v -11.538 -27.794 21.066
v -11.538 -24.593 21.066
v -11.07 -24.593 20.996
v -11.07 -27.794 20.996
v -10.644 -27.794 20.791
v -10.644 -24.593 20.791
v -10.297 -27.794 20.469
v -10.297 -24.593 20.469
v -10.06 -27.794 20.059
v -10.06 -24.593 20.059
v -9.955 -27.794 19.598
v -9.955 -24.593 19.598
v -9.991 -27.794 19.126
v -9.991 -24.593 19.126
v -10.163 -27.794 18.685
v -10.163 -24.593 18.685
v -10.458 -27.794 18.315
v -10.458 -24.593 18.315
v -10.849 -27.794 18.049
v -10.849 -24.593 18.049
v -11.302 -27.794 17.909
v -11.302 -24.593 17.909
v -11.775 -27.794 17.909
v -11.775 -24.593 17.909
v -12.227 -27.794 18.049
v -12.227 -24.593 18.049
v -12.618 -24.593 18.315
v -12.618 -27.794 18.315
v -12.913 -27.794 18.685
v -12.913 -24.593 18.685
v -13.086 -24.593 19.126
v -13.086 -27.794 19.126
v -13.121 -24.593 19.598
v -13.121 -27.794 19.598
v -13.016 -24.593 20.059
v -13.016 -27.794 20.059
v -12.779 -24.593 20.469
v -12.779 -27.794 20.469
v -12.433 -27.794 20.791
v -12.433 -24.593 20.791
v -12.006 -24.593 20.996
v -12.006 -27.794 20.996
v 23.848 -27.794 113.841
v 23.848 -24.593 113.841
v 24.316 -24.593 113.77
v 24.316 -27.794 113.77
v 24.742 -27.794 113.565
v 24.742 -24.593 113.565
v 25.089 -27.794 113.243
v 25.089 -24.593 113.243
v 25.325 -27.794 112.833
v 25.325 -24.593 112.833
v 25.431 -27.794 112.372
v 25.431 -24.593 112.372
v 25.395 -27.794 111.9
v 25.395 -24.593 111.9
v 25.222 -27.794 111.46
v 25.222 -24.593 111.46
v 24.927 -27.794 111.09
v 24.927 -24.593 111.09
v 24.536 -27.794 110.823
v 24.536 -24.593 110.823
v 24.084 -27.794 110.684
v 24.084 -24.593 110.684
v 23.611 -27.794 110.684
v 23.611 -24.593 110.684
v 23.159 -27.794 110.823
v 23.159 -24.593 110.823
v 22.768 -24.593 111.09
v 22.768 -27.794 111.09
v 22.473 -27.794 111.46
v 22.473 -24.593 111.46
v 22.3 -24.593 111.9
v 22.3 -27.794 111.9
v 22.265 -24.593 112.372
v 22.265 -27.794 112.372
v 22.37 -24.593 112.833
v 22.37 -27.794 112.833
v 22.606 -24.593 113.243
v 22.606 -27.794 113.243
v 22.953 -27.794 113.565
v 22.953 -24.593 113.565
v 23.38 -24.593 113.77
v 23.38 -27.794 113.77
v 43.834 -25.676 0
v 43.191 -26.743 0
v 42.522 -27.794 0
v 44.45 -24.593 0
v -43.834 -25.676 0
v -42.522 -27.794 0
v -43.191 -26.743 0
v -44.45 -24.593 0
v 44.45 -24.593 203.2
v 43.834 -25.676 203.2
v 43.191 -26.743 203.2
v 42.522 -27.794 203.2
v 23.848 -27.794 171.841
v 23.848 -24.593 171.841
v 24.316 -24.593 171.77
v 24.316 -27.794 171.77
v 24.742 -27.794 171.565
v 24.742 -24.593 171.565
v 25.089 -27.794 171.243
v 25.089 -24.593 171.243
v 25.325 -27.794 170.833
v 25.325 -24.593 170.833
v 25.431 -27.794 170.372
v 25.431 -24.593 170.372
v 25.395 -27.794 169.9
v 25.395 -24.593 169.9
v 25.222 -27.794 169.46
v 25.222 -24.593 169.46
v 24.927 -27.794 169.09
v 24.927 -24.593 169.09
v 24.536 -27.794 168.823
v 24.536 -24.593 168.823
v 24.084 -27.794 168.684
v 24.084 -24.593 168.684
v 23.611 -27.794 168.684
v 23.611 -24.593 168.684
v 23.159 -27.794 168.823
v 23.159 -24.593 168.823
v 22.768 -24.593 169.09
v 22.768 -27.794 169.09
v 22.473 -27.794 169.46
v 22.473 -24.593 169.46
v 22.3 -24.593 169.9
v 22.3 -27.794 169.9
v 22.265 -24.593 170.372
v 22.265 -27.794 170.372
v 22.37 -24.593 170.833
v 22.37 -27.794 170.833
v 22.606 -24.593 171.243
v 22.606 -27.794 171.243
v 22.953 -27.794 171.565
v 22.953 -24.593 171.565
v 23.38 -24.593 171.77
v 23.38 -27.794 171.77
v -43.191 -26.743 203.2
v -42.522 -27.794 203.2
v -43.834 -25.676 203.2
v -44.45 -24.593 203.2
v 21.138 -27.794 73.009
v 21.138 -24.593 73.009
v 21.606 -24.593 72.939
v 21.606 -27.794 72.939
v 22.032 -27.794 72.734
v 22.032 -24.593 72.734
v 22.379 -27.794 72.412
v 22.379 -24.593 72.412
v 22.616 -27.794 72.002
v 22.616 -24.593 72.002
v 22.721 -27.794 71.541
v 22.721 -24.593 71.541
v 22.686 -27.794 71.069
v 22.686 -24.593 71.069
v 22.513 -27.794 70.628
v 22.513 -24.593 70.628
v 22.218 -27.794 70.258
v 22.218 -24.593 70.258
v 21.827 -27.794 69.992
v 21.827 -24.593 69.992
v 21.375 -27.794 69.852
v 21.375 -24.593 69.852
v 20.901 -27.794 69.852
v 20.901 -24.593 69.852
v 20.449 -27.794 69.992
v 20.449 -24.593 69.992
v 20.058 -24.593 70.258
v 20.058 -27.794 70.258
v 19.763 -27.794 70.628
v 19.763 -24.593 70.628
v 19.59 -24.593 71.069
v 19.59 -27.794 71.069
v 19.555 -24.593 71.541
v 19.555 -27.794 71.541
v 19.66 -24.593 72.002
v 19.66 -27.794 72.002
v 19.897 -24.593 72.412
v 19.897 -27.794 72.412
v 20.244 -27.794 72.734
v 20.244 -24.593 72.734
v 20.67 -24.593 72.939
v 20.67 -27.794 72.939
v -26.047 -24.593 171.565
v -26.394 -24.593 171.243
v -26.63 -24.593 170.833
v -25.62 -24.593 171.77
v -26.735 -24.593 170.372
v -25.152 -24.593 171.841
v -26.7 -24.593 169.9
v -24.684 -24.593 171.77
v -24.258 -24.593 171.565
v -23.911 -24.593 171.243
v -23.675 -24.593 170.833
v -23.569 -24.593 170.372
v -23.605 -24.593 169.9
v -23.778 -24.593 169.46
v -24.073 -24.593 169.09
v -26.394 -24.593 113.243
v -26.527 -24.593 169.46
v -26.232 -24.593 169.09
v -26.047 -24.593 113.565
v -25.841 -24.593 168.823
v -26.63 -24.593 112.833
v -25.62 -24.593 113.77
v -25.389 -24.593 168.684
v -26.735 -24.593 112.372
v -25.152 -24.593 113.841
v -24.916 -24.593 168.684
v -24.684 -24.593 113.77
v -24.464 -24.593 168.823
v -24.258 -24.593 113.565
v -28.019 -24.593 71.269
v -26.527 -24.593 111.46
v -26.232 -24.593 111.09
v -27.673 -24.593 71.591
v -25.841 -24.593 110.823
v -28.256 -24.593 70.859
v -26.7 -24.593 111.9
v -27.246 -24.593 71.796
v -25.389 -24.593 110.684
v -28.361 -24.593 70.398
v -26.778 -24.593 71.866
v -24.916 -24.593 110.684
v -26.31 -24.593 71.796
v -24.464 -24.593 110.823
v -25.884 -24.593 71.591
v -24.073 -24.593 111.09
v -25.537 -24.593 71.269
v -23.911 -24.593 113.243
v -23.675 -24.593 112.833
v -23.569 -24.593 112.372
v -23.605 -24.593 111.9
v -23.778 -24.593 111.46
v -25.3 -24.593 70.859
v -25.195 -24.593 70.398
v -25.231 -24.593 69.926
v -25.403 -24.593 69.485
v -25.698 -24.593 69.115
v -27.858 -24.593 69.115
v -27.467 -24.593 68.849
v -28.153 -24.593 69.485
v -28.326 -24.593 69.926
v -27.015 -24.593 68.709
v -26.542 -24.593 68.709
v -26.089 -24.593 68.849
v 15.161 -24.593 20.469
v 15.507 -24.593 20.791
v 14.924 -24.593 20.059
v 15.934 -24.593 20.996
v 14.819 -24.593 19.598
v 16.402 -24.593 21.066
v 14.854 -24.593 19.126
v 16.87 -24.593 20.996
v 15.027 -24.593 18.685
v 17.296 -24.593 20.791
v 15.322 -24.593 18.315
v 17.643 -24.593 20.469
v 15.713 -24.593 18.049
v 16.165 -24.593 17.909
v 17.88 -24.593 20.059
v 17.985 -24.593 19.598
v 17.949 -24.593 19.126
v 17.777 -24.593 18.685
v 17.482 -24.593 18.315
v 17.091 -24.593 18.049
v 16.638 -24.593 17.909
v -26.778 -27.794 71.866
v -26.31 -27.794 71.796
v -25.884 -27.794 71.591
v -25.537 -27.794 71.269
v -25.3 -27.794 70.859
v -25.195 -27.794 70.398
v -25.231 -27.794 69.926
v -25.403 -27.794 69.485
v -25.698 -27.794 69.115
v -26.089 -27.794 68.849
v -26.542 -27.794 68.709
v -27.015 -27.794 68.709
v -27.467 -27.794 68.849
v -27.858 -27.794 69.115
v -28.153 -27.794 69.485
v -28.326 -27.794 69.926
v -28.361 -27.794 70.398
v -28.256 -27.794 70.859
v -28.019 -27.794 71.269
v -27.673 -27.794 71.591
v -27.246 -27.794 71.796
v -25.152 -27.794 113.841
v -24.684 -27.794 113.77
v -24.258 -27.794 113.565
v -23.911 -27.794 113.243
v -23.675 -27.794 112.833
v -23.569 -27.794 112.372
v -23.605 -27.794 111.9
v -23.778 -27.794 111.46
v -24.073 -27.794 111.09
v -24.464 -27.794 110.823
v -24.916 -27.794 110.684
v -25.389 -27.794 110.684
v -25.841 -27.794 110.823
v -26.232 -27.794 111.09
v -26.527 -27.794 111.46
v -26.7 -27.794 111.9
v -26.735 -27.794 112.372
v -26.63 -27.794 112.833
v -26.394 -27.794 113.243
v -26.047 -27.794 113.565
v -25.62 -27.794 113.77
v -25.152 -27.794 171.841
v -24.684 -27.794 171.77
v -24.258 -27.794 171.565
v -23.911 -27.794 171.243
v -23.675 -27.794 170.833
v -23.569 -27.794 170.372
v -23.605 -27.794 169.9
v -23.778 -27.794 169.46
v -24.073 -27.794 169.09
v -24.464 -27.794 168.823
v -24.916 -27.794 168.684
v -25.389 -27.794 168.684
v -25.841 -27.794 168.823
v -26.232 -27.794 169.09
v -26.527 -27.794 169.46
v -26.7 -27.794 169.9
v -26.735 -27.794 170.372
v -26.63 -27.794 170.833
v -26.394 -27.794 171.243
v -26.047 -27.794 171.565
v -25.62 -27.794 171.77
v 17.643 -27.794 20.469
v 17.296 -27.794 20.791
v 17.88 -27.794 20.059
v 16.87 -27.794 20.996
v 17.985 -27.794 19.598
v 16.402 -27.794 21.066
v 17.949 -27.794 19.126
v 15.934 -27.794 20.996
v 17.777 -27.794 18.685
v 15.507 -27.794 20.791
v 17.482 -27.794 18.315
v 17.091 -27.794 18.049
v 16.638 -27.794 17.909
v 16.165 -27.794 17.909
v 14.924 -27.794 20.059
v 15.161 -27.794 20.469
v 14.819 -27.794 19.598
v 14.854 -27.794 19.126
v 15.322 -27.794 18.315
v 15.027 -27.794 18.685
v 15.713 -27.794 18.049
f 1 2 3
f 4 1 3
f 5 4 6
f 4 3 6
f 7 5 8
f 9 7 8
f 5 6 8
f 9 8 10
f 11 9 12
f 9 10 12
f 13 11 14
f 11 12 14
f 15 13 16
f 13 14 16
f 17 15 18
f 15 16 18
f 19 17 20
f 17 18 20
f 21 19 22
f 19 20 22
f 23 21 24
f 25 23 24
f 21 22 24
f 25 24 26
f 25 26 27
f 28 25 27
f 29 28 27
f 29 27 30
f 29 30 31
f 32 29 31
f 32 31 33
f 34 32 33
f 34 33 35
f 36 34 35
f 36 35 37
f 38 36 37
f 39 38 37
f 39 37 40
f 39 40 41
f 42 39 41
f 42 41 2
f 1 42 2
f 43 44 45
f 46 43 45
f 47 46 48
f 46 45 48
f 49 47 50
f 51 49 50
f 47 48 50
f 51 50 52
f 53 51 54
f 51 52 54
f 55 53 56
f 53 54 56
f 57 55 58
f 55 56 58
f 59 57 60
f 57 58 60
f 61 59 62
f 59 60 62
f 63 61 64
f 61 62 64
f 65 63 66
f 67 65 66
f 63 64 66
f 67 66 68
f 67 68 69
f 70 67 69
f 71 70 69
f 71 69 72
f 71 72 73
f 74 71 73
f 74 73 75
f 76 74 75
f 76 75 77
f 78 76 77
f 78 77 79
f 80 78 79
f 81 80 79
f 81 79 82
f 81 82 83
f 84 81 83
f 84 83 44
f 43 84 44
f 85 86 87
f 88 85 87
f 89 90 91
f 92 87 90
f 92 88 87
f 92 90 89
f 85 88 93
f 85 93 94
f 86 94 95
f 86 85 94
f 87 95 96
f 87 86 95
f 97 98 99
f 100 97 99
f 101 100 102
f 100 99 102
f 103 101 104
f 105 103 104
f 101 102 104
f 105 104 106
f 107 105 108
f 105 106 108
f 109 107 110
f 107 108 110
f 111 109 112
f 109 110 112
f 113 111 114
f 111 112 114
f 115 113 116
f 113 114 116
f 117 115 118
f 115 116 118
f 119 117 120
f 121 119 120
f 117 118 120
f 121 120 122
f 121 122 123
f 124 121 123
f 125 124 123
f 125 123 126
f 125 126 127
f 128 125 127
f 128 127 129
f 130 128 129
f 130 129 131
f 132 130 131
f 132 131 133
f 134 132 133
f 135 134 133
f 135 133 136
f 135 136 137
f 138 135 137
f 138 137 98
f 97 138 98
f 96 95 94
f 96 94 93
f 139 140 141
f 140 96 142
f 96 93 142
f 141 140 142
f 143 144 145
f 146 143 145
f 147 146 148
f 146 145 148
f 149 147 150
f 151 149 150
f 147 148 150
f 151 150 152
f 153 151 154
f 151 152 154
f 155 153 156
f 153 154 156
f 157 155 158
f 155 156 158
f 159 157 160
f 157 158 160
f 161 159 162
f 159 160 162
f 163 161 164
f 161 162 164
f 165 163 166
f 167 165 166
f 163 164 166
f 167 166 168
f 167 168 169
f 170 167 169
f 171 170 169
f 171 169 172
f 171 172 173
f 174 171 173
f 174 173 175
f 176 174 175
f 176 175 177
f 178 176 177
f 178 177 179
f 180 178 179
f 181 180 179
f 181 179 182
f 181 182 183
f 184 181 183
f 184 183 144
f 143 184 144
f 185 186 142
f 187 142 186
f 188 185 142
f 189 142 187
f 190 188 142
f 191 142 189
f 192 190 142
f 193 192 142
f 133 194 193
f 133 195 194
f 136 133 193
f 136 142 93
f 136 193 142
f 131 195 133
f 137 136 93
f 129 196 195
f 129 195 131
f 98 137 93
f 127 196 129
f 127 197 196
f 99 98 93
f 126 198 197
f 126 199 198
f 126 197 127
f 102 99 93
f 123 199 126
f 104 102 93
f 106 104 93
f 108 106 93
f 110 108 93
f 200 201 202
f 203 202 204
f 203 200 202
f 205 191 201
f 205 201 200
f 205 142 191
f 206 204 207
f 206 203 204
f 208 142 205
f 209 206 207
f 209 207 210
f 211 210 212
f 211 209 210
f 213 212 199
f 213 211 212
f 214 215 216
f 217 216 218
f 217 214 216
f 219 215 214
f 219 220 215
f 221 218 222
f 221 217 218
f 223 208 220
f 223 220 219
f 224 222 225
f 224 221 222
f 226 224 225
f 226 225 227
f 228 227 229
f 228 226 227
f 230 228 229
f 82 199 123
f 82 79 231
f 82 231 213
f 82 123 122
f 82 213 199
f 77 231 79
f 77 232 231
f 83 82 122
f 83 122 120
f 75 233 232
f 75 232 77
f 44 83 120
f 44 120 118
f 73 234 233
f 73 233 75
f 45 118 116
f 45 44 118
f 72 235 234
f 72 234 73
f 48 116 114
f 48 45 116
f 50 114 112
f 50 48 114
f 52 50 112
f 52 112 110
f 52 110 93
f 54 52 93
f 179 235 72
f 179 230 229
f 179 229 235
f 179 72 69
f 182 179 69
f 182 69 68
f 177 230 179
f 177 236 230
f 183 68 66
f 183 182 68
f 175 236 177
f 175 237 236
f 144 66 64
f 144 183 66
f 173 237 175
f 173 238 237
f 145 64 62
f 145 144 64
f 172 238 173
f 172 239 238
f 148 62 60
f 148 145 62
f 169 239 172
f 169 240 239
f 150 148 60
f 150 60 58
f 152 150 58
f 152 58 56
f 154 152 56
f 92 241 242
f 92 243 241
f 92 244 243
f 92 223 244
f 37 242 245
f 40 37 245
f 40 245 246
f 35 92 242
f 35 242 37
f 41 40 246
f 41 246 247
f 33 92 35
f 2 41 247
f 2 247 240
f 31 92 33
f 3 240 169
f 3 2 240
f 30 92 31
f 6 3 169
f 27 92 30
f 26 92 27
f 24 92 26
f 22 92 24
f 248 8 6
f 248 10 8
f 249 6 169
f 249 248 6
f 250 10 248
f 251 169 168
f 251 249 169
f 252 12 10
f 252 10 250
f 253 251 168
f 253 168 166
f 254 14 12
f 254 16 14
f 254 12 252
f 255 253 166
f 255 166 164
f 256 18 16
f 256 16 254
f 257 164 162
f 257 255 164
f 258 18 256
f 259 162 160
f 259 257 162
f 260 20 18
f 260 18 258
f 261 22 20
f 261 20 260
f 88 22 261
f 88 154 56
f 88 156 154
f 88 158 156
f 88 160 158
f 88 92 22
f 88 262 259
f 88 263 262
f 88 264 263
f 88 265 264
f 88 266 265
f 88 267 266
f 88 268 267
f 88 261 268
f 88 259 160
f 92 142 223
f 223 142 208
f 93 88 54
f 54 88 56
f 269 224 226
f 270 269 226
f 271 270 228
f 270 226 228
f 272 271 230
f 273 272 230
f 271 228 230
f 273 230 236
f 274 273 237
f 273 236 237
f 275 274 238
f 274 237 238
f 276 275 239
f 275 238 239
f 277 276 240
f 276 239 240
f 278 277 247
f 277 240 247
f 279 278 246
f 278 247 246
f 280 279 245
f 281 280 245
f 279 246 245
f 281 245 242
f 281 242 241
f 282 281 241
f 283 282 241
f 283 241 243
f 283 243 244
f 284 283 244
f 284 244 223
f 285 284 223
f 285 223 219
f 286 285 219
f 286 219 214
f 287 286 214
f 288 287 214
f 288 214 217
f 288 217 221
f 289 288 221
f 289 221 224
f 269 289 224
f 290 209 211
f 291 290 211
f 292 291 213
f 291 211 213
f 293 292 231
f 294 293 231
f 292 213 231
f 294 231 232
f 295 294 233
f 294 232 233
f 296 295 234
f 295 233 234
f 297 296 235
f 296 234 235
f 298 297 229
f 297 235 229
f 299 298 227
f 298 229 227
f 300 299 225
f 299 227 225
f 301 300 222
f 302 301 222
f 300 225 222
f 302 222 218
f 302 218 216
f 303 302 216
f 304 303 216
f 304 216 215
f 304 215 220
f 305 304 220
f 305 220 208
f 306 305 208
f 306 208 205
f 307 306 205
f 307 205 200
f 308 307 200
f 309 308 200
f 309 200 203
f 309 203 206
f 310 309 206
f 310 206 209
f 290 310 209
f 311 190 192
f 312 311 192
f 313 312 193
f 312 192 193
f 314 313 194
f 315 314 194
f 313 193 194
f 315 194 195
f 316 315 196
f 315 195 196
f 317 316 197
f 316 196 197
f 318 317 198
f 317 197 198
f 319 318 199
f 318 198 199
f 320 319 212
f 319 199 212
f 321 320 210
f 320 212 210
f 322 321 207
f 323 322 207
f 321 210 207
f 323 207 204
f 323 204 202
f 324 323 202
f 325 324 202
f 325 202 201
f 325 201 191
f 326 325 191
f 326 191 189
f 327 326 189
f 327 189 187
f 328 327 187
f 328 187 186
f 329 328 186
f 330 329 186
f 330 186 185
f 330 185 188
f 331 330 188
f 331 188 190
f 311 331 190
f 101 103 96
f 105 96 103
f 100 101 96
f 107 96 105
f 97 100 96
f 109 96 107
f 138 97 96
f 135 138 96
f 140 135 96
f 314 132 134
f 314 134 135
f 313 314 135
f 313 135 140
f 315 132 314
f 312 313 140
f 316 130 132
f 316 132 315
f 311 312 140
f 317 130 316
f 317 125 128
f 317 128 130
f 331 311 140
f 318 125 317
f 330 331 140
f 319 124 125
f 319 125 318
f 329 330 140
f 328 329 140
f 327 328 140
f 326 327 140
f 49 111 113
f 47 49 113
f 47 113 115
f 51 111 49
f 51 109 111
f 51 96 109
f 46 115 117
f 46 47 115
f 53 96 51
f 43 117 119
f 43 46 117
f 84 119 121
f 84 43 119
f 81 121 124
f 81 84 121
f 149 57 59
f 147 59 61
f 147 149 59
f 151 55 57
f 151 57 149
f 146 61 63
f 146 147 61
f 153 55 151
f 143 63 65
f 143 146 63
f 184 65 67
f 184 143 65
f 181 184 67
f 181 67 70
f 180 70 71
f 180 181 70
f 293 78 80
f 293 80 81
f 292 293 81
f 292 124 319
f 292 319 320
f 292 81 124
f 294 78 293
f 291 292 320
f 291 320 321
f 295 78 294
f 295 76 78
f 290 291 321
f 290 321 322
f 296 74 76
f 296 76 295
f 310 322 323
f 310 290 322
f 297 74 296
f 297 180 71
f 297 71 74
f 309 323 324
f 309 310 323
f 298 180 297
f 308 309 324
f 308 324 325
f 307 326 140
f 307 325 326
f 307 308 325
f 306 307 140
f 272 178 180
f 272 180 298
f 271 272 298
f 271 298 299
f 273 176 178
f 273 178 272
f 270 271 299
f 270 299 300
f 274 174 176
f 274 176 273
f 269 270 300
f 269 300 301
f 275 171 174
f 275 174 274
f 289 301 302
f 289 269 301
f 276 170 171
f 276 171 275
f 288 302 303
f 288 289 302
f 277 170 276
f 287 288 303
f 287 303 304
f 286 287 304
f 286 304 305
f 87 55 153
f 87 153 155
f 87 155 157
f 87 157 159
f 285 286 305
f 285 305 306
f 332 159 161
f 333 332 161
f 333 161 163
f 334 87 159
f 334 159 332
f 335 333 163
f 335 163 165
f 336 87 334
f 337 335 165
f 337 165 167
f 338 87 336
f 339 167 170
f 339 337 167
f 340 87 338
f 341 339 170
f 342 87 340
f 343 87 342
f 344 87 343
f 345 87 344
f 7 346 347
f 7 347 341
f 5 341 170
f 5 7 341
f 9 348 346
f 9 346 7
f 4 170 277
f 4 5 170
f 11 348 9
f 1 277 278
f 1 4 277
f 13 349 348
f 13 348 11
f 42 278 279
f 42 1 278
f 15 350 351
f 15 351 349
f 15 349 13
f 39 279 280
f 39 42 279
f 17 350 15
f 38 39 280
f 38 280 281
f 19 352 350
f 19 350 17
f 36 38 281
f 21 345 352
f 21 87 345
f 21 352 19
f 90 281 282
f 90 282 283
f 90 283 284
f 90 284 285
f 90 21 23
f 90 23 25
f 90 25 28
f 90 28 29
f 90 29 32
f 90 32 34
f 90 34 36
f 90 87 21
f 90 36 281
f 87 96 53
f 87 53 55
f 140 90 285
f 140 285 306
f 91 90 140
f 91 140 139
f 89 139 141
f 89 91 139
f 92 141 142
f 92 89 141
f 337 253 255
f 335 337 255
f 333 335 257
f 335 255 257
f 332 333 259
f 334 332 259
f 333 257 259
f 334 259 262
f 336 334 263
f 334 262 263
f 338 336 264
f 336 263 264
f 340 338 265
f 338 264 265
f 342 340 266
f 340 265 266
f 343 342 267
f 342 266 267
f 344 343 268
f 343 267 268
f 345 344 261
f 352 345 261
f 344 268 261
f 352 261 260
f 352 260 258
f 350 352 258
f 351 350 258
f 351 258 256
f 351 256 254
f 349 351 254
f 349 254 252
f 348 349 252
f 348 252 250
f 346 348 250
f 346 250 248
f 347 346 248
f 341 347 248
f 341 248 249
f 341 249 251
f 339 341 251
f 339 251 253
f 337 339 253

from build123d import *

# Parameters (mm, degrees)
BOSS_EXTRUDE1_DEPTH = 203.2
SKETCH3_R           = 1.5875
CUT_EXTRUDE1_DEPTH  = 209.029529299
SKETCH4_R           = 1.5875
CUT_EXTRUDE2_DEPTH  = 209.029529299


with BuildPart() as part:
    # Sketch2 → Boss-Extrude1 (new body)
    with BuildSketch(Plane.XY):
        with BuildLine():
            Line((-44.45, -24.593444248), (44.45, -24.593444248))
            ThreePointArc((44.45, -24.593444248), (43.515559877, -26.211372506), (42.522255607, -27.793844248))
            Line((42.522255607, -27.793844248), (-42.522255607, -27.793844248))
            ThreePointArc((-42.522255607, -27.793844248), (-43.515559877, -26.211372506), (-44.45, -24.593444248))
        make_face()
    extrude(amount=BOSS_EXTRUDE1_DEPTH)

    # Sketch3 → Cut-Extrude1 (cut, through all)
    with BuildSketch(Plane(origin=(0, -24.593444248, 0), x_dir=(1, 0, 0), z_dir=(0, 1, 0))):
        with Locations(Location((16.401757706, -19.478925293, 0), (0, 0, 270))):
            Circle(SKETCH3_R)
        with Locations(Location((-26.778242294, -70.278925293, 0), (0, 0, 270))):
            Circle(SKETCH3_R)
        with Locations(Location((21.137926992, -71.421925293, 0), (0, 0, 270))):
            Circle(SKETCH3_R)
        with Locations(Location((-11.538242294, -19.478925293, 0), (0, 0, 270))):
            Circle(SKETCH3_R)
    extrude(amount=-CUT_EXTRUDE1_DEPTH, mode=Mode.SUBTRACT)

    # Sketch4 → Cut-Extrude2 (cut, through all)
    with BuildSketch(Plane(origin=(0, -24.593444248, 0), x_dir=(1, 0, 0), z_dir=(0, 1, 0))):
        with Locations(Location((-25.152417206, -170.253365494, 0), (0, 0, 270))):
            Circle(SKETCH4_R)
        with Locations(Location((23.847582794, -170.253365494, 0), (0, 0, 270))):
            Circle(SKETCH4_R)
        with Locations(Location((23.847582794, -112.253365494, 0), (0, 0, 270))):
            Circle(SKETCH4_R)
        with Locations(Location((-25.152417206, -112.253365494, 0), (0, 0, 270))):
            Circle(SKETCH4_R)
    extrude(amount=-CUT_EXTRUDE2_DEPTH, mode=Mode.SUBTRACT)


solid = part.part
